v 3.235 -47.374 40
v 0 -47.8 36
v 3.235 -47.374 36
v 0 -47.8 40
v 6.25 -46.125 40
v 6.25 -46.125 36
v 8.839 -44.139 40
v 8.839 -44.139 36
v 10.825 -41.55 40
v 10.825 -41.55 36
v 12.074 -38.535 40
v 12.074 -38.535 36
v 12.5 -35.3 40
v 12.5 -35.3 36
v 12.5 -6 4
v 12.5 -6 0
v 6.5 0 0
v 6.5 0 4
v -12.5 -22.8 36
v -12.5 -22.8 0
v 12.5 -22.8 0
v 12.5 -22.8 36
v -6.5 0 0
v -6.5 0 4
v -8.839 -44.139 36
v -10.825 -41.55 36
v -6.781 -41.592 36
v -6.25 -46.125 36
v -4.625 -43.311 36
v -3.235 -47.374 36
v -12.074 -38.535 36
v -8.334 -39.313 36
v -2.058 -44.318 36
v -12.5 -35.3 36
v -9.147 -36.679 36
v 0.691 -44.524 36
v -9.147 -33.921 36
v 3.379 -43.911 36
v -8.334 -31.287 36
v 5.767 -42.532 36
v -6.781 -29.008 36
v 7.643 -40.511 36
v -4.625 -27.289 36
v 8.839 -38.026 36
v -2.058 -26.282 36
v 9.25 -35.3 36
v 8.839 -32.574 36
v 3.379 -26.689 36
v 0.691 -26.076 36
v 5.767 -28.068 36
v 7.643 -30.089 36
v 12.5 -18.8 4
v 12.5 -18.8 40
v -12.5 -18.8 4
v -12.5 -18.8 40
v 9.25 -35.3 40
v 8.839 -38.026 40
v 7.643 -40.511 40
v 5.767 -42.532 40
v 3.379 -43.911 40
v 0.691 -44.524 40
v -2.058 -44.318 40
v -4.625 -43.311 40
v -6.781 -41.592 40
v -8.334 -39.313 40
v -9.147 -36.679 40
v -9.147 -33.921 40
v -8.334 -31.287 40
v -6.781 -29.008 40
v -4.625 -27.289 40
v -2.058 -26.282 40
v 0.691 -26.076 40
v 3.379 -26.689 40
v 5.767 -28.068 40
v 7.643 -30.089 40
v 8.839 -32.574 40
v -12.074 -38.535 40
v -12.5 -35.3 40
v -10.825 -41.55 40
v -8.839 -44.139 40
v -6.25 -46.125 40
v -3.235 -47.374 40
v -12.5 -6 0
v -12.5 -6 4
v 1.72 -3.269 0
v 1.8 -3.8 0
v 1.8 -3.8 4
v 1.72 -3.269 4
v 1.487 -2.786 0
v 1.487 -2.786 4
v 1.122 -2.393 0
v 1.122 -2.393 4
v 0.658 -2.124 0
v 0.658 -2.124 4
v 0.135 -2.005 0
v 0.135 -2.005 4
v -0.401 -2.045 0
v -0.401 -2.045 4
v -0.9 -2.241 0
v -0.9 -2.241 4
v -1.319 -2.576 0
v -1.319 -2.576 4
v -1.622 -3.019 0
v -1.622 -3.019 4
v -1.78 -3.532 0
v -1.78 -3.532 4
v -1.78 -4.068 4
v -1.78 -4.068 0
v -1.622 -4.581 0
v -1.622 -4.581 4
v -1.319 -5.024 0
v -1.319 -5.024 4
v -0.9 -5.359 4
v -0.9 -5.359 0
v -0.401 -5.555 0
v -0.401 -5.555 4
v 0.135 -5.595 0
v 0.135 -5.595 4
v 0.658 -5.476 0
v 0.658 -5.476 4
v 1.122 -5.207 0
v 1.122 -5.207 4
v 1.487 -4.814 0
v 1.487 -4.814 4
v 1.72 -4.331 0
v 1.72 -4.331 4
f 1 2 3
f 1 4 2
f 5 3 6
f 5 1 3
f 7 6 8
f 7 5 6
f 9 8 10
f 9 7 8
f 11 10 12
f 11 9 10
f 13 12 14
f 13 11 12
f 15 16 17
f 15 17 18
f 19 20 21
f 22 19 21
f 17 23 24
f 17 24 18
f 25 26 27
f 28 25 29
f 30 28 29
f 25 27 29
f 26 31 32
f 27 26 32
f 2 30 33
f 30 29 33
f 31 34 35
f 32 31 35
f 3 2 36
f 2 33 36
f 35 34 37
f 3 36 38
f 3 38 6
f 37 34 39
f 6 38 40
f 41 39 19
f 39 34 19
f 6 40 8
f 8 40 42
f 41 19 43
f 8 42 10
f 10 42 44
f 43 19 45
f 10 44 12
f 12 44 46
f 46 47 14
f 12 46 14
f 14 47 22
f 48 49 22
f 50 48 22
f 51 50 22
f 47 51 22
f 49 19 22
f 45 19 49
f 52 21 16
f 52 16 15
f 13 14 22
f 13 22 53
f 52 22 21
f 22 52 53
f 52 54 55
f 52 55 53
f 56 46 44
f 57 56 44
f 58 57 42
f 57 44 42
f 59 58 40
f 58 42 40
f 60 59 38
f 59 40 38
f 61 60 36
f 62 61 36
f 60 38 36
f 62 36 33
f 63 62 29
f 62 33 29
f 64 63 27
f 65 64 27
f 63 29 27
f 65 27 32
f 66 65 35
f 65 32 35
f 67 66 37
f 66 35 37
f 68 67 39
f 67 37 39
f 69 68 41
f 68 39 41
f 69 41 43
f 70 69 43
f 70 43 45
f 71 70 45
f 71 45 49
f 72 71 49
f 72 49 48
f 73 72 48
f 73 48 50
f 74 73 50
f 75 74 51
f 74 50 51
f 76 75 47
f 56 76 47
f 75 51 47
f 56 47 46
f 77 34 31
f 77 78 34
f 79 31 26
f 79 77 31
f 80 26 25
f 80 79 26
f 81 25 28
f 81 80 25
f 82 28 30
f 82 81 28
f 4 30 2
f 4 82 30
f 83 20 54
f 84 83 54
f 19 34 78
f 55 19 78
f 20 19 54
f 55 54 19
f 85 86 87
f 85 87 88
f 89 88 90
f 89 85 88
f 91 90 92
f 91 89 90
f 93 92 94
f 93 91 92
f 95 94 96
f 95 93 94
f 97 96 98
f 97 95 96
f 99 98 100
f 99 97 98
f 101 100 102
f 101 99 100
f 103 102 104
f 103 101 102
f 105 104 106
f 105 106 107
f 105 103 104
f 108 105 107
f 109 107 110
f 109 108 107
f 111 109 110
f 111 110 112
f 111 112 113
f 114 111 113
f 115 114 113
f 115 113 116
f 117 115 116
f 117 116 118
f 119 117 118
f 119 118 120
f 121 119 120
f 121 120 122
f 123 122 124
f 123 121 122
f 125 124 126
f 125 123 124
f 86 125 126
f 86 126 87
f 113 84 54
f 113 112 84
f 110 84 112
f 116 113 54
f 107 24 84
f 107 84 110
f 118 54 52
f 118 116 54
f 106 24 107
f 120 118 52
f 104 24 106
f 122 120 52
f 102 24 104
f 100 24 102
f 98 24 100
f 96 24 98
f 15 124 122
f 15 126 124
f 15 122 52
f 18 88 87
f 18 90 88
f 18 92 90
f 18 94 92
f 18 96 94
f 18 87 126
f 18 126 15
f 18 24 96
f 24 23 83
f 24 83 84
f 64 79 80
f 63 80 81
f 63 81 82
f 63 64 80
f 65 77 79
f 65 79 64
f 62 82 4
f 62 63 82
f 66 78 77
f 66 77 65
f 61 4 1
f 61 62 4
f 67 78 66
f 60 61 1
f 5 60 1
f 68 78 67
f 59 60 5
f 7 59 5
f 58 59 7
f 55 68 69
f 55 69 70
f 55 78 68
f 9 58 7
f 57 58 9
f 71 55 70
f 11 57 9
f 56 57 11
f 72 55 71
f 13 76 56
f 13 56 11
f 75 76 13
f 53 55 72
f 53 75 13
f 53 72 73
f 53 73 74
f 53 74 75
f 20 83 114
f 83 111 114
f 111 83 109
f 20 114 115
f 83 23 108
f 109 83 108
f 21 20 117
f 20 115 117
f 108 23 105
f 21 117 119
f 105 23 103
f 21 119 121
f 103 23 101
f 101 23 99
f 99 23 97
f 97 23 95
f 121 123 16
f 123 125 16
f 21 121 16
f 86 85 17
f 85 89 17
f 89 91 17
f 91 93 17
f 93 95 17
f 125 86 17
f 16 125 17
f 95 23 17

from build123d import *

# Parameters (mm, degrees)
F0_W     = 25
F0_H     = 18.8
F0_R     = 1.8
F1_DEPTH = 4
F0_H_2   = 4
F2_DEPTH = 40
F3_W     = 25
F3_H     = 4
F4_DEPTH = 25
F5_R     = 9.25
F6_DEPTH = 4
F7_R     = 12.49999
F8_SIZE  = 6


# Not quite as in the source:
# - a fillet or chamfer is up to 0.001 mm smaller than in the source, because OpenCascade refuses the exact size


with BuildPart() as f1:
    # F0 (on Top) → F1 (new body)
    with BuildSketch(Plane.XY):
        with Locations((0, -9.4)):
            Rectangle(F0_W, F0_H)
        with Locations((0, -3.8)):
            Circle(F0_R, mode=Mode.SUBTRACT)
    extrude(amount=F1_DEPTH)

    # F0 (on Top) → F2 (join)
    with BuildSketch(Plane.XY):
        with Locations((0, -20.8)):
            Rectangle(F0_W, F0_H_2)
    extrude(amount=F2_DEPTH)

    # F3 (on face) → F4 (join)
    with BuildSketch(Plane.XZ.offset(22.8)):
        with Locations((0, 38)):
            Rectangle(F3_W, F3_H)
    extrude(amount=F4_DEPTH)

    # F5 (on face) → F6 (cut, through all)
    with BuildSketch(Plane(origin=(0, 0, 36), x_dir=(1, 0, 0), z_dir=(0, 0, -1))):
        with Locations((0, 35.3)):
            Circle(F5_R)
    extrude(amount=-F6_DEPTH, mode=Mode.SUBTRACT)

    # F7 (radius 12.5 in the source; OpenCascade refuses exactly that, so slightly less here)
    f7_edges = [f1.edges().sort_by_distance(p)[0] for p in [
        (12.5, -47.8, 38),
        (-12.5, -47.8, 38),
    ]]
    fillet(f7_edges, radius=F7_R)

    # F8
    f8_edges = [f1.edges().sort_by_distance(p)[0] for p in [
        (12.5, 0, 2),
        (-12.5, 0, 2),
    ]]
    chamfer(f8_edges, length=F8_SIZE)


solid = f1.part
